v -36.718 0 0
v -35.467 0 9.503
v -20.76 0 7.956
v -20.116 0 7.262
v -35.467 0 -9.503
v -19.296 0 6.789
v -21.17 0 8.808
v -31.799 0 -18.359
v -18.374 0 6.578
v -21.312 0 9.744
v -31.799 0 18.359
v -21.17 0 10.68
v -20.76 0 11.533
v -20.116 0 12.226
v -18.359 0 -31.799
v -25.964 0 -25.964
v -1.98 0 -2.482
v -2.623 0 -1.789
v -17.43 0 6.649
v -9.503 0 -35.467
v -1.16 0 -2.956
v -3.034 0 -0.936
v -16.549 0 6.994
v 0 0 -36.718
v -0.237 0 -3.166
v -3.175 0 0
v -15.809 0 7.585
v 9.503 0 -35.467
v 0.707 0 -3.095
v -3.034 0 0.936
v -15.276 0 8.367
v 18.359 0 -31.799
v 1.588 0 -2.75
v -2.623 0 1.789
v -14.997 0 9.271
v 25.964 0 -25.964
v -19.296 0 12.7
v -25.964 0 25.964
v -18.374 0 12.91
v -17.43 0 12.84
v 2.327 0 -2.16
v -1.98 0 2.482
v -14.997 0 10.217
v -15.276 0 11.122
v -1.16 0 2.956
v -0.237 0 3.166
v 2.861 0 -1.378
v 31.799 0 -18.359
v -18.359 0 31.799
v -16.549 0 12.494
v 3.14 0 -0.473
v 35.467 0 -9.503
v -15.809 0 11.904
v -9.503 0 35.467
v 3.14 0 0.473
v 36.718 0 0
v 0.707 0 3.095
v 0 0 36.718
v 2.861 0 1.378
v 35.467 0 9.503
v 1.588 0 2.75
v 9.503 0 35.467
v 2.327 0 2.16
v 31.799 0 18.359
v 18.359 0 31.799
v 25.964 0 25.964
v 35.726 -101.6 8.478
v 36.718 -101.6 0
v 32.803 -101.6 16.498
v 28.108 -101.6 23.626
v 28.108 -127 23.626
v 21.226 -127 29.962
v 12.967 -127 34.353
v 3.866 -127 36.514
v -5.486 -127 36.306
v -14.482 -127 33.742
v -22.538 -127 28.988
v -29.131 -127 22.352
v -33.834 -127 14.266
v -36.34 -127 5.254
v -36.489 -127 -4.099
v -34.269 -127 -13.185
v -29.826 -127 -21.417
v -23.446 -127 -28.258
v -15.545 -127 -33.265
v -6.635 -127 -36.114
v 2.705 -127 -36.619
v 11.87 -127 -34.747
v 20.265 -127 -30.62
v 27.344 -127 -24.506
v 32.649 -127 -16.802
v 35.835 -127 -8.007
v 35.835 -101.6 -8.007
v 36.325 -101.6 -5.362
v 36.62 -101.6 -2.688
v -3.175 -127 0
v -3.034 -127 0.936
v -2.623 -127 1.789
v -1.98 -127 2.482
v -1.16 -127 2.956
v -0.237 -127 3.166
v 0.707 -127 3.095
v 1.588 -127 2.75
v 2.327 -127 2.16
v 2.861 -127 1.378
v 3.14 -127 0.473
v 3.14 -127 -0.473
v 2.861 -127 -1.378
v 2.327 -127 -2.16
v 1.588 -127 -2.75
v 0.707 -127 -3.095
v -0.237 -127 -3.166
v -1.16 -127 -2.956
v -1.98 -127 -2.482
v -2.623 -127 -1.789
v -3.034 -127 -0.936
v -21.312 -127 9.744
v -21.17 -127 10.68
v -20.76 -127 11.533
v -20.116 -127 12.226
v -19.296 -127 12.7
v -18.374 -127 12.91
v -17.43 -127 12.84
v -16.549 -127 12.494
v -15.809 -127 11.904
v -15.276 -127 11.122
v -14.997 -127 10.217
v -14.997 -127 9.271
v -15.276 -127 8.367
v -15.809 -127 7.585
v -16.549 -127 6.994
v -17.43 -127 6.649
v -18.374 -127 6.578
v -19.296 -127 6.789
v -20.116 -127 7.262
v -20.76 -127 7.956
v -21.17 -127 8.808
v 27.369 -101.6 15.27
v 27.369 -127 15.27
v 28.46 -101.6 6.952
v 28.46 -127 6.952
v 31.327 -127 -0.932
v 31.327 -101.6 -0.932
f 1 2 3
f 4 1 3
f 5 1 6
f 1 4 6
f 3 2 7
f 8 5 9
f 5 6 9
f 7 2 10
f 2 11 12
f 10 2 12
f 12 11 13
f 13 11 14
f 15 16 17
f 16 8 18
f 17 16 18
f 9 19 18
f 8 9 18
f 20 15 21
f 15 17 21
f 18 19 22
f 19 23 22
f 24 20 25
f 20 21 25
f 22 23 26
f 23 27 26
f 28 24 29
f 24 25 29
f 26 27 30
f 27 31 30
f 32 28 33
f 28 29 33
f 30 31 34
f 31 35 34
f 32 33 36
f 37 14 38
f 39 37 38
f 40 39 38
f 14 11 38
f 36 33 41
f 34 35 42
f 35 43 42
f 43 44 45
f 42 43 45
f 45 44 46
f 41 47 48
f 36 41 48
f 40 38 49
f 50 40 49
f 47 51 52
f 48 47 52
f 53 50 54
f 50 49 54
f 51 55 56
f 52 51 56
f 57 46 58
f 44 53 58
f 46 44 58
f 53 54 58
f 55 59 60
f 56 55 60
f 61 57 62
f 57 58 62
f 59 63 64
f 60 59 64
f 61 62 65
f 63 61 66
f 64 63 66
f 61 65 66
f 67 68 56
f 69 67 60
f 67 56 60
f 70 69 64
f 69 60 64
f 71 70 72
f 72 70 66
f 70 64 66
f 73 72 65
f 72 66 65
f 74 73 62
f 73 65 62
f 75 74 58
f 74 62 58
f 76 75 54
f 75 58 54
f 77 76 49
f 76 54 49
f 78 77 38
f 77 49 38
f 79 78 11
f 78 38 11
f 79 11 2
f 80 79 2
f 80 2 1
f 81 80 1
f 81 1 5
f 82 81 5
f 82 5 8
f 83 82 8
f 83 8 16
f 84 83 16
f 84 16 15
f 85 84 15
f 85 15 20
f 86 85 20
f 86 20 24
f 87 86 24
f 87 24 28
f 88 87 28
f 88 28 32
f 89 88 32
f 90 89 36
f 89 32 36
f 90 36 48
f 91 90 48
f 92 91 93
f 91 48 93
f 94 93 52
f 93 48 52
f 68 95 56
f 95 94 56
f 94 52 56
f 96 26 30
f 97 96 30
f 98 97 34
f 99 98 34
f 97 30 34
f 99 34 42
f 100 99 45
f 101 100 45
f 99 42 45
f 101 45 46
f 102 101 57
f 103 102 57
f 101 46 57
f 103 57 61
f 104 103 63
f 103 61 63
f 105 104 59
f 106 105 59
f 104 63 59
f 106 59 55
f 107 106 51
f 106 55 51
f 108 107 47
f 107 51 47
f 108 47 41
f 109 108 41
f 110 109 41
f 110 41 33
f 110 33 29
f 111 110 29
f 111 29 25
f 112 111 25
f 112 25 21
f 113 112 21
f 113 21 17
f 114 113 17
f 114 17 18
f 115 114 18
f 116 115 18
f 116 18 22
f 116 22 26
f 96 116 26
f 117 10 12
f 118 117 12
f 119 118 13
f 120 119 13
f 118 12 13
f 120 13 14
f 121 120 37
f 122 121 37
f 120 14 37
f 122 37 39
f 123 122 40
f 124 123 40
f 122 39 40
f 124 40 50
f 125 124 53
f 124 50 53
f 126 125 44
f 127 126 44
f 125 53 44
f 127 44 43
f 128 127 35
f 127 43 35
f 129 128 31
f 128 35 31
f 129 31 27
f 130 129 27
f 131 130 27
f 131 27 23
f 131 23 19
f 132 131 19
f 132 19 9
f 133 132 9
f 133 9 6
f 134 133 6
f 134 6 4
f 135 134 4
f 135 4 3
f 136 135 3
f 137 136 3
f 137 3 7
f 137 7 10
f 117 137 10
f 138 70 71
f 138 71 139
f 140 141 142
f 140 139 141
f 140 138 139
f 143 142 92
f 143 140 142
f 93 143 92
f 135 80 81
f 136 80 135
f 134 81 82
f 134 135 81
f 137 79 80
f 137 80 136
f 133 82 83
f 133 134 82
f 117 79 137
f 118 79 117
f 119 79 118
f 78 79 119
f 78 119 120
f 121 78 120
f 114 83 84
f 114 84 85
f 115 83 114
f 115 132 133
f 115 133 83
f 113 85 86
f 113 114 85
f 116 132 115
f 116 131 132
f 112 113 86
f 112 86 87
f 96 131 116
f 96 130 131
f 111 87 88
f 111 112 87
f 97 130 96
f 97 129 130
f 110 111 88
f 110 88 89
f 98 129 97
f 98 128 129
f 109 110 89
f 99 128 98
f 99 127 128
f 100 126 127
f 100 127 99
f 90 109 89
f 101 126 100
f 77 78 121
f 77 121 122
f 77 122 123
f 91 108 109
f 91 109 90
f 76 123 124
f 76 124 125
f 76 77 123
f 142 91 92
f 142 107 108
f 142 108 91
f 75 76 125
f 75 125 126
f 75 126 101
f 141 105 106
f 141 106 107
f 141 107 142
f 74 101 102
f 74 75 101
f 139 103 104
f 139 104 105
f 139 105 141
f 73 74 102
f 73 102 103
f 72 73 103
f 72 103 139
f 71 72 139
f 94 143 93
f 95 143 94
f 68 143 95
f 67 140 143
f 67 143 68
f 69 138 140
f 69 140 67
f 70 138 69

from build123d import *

# Parameters (mm, degrees)
F0_R     = 36.718352
F1_DEPTH = 127
F3_R     = 38.474743
F4_DEPTH = 62.738
F6_D     = 6.35


with BuildPart() as f1:
    # F0 (on Front) → F1 (new body)
    with BuildSketch(Plane.XZ):
        Circle(F0_R)
    extrude(amount=F1_DEPTH)

    # F3 (on offset) → F4 (cut)
    with BuildSketch(Plane.XZ.offset(101.6)):
        with Locations((65.835573, 16.081614)):
            Circle(F3_R)
    extrude(amount=F4_DEPTH, mode=Mode.SUBTRACT)

    # F6 (through all)
    with Locations(Plane.XZ.offset(127)):
        with Locations((-18.136533, 9.744127), (0, 0)):
            Hole(F6_D / 2)


solid = f1.part
